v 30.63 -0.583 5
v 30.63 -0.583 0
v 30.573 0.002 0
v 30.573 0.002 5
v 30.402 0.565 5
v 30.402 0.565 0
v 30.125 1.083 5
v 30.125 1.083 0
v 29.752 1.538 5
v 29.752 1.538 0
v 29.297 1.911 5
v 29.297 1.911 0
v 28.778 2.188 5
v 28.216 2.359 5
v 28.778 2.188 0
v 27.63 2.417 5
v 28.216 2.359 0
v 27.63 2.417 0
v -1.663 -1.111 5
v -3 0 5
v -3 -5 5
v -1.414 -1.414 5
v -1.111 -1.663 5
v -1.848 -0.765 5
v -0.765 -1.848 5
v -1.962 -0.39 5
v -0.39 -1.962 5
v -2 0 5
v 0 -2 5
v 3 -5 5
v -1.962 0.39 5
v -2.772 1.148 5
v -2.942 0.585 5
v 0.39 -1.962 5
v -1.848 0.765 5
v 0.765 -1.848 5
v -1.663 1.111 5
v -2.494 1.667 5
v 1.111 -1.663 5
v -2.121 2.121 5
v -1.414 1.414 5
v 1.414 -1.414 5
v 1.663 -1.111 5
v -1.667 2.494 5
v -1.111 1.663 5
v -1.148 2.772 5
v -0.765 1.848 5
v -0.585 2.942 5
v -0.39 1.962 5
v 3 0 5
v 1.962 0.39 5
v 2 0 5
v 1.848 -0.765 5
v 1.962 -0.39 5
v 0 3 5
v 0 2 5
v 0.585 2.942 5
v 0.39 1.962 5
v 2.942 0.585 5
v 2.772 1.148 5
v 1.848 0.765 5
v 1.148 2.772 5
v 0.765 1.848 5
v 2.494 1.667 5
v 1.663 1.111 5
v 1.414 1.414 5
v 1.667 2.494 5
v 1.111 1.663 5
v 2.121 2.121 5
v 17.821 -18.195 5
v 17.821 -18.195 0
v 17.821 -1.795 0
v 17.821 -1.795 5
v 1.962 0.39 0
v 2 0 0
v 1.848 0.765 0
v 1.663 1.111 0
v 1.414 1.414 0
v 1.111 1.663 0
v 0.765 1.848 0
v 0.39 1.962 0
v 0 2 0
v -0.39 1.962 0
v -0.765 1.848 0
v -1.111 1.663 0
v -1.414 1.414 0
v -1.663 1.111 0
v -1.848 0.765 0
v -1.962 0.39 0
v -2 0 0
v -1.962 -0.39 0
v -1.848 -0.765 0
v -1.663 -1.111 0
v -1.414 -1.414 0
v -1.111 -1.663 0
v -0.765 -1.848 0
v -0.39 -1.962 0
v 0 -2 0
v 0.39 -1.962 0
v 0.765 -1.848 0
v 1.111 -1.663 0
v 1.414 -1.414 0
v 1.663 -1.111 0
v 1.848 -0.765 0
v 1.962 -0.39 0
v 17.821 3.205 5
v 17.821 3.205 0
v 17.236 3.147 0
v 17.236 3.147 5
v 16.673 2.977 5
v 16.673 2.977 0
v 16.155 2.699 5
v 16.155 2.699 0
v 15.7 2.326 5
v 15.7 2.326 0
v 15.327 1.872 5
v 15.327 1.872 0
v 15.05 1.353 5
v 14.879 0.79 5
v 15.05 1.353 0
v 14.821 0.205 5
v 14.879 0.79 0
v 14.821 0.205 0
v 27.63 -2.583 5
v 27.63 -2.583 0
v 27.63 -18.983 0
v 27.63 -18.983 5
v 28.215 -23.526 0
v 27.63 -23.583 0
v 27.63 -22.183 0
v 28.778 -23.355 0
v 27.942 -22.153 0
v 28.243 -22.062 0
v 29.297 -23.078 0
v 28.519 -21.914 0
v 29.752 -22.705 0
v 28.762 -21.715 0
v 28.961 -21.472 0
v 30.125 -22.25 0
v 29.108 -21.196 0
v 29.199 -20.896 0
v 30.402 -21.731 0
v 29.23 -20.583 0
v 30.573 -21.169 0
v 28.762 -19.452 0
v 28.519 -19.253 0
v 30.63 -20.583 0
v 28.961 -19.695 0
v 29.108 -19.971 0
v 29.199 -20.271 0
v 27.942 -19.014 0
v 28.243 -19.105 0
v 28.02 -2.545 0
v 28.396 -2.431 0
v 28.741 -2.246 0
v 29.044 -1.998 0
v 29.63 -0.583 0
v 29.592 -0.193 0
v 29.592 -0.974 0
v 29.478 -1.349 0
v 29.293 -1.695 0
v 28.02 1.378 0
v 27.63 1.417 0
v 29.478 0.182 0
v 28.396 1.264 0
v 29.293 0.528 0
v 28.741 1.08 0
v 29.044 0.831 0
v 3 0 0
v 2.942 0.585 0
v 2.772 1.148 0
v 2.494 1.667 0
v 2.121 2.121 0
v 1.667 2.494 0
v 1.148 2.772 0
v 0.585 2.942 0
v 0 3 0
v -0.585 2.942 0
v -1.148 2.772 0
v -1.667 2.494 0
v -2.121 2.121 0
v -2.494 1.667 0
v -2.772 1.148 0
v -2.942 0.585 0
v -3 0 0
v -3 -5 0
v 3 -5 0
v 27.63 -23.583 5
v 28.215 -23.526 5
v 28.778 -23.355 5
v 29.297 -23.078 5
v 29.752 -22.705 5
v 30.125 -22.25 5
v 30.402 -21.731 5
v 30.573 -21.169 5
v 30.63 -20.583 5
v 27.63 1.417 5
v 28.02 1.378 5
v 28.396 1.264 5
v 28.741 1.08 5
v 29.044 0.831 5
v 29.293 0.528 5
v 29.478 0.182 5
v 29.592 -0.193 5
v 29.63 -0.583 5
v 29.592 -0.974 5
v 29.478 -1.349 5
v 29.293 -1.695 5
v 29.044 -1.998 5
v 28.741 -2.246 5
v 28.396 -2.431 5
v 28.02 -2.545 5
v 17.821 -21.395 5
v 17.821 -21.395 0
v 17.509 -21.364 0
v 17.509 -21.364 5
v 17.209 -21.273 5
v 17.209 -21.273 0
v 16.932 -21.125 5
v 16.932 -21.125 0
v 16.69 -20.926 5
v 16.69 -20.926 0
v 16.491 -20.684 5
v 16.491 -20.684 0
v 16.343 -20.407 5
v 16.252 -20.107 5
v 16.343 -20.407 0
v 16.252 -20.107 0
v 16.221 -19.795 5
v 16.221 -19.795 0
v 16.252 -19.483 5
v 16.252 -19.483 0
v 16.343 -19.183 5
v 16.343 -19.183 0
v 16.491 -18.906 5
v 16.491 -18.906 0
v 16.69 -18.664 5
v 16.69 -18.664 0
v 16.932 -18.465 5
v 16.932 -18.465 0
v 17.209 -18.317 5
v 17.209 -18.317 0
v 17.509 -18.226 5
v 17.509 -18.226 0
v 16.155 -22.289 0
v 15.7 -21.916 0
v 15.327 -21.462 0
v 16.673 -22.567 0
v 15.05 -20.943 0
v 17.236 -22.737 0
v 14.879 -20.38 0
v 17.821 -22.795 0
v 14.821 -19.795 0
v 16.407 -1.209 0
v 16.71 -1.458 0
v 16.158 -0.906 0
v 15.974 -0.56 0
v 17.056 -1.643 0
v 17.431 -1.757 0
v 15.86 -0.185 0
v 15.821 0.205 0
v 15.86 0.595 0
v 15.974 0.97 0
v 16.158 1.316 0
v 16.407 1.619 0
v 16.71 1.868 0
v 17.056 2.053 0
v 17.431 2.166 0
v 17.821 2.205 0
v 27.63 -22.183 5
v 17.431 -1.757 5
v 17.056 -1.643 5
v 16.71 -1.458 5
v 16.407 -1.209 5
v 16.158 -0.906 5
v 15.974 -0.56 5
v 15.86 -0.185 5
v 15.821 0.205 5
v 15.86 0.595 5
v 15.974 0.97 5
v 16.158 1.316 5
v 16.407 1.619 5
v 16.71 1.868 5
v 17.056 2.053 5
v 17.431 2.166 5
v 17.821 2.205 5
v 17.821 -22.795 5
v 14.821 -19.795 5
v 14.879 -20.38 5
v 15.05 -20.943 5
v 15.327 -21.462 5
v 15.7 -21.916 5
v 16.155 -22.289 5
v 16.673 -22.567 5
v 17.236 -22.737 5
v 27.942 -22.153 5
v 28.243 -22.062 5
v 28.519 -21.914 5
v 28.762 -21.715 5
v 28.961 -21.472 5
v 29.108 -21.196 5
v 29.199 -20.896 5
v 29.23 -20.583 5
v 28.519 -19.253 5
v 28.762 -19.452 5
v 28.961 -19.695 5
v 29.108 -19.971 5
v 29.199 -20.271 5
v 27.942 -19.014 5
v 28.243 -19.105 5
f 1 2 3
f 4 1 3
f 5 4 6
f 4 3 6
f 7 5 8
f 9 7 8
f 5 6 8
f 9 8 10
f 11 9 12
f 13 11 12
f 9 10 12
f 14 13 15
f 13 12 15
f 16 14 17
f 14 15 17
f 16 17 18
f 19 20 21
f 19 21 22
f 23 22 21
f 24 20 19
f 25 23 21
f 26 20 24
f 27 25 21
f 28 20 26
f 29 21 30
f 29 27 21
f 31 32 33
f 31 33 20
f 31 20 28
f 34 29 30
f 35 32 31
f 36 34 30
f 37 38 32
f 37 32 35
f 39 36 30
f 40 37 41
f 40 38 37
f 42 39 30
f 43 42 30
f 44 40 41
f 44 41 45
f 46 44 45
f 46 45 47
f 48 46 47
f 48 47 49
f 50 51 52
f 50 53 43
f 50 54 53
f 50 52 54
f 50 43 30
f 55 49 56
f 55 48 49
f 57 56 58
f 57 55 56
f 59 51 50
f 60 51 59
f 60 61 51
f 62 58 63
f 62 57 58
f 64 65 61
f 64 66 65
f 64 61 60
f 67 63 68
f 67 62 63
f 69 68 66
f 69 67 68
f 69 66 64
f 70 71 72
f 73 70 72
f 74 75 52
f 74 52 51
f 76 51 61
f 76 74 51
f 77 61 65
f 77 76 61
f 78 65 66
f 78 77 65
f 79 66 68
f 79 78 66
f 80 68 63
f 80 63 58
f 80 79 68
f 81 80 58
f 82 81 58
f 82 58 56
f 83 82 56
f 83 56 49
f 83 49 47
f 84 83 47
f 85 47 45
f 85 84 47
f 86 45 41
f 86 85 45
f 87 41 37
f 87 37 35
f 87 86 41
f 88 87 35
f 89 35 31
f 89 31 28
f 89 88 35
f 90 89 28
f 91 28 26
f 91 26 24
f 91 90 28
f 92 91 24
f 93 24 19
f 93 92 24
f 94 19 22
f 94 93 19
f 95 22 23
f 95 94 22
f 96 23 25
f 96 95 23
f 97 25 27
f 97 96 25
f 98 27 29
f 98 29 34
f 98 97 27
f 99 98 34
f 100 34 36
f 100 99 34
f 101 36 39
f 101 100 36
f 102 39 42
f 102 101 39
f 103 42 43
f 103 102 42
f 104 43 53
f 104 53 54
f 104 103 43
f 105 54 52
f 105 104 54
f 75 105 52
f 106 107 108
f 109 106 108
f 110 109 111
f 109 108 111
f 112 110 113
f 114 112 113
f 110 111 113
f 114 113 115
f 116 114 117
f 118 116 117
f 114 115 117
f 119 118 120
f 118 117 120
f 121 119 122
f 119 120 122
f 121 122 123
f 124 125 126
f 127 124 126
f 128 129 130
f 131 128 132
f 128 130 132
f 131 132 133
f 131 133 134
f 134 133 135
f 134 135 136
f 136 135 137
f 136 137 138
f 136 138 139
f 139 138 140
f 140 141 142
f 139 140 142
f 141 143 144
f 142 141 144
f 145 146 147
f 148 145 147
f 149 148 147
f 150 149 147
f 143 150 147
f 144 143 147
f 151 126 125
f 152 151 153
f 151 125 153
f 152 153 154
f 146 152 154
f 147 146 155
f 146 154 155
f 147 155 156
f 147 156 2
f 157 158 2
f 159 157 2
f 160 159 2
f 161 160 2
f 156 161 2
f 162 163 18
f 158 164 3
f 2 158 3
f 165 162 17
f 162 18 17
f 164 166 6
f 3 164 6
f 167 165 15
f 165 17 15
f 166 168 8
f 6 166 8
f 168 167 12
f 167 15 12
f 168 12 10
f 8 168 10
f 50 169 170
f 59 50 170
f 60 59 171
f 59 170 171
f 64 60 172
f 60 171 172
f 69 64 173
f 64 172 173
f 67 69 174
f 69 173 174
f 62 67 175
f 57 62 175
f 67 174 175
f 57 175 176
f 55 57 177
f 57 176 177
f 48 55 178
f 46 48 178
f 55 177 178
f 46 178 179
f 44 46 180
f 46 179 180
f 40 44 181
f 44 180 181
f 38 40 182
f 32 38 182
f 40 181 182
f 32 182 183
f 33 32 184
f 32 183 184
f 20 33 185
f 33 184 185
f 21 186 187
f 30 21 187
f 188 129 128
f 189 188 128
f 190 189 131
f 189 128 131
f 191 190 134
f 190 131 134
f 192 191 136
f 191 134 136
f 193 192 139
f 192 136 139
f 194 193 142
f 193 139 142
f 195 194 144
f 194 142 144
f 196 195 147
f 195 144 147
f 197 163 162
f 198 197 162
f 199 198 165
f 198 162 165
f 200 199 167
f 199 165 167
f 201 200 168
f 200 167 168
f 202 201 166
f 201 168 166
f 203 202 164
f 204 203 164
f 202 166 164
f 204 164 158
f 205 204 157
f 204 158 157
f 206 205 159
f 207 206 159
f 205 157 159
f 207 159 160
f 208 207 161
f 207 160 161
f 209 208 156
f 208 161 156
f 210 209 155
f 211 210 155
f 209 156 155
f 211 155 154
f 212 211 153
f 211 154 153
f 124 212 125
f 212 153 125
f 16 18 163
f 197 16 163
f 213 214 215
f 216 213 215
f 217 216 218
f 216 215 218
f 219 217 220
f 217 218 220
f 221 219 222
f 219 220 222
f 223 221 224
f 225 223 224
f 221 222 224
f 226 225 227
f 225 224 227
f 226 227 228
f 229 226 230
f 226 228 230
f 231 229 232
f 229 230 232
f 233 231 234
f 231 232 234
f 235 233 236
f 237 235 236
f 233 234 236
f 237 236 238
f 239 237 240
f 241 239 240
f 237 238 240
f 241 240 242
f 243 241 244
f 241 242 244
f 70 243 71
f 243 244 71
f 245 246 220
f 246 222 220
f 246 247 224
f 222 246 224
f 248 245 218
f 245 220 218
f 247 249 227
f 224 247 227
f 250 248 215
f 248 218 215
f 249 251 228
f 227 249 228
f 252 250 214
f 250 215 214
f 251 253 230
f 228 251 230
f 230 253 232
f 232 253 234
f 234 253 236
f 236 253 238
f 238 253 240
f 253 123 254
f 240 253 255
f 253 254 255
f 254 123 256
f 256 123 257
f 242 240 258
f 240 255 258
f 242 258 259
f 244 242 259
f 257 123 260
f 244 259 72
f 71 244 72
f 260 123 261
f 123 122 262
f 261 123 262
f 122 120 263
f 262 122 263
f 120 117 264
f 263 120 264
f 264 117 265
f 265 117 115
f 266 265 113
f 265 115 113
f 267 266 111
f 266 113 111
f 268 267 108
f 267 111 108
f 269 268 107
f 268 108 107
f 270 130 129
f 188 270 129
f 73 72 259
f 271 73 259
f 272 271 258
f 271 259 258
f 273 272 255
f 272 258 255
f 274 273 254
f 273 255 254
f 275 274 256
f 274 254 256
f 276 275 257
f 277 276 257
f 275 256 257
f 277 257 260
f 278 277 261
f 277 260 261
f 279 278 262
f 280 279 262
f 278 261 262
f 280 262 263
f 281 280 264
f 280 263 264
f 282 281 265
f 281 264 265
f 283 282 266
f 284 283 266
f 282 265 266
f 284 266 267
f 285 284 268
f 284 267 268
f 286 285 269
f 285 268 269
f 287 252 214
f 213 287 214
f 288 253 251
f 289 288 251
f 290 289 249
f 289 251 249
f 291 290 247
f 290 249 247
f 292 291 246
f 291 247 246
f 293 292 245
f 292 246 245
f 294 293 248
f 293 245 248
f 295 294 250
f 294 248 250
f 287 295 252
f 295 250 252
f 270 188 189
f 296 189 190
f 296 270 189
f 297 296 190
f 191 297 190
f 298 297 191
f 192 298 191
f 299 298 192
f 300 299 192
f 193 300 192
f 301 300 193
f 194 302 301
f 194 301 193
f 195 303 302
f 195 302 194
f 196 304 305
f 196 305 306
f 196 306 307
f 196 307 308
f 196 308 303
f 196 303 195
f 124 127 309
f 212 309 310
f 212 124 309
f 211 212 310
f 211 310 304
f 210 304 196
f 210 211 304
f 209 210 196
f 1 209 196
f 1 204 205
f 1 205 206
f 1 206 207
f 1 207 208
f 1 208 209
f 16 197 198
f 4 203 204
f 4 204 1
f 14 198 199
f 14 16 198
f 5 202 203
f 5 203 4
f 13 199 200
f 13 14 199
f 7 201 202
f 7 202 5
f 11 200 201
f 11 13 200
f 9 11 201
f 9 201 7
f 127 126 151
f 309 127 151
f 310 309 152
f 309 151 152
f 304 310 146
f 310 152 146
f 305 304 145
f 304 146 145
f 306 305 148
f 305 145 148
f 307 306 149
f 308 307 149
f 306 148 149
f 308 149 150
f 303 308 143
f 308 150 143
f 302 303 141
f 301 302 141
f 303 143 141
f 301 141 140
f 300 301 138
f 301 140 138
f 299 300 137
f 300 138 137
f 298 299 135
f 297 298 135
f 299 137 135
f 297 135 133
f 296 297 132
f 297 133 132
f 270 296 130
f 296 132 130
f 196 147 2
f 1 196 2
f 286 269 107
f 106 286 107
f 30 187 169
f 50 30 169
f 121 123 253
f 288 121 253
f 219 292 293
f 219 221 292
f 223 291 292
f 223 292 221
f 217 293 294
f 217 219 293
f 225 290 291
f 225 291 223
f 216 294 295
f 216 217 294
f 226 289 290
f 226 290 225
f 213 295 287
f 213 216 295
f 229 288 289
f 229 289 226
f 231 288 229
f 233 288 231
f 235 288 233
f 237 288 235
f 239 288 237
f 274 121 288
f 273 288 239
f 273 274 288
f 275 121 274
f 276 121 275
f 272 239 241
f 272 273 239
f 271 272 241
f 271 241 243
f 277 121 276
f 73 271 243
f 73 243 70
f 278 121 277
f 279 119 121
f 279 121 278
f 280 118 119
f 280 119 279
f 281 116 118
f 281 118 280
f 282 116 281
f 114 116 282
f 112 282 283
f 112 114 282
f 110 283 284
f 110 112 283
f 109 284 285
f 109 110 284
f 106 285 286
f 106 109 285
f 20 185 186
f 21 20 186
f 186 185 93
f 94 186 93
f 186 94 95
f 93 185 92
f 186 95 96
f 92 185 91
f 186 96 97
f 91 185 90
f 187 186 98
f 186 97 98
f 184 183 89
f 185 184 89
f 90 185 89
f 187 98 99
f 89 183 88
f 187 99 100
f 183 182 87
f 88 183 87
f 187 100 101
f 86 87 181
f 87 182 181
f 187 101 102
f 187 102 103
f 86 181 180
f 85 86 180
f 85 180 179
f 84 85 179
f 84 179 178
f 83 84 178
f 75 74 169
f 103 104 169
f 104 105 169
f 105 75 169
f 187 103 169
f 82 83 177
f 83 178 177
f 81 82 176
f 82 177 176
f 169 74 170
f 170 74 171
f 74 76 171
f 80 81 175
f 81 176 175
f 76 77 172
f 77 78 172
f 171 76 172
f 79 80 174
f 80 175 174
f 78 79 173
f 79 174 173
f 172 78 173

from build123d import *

# Parameters (mm, degrees)
F0_R     = 2
F1_DEPTH = 5
F3_DEPTH = 5
F5_DEPTH = 5


with BuildPart() as f1:
    # F0 (on Top) → F1 (new body)
    with BuildSketch(Plane.XY):
        with BuildLine():
            Line((3, -5), (3, 0))
            ThreePointArc((3, 0), (0, 3), (-3, 0))
            Line((-3, 0), (-3, -5))
            Line((-3, -5), (3, -5))
        make_face()
        Circle(F0_R, mode=Mode.SUBTRACT)
    extrude(amount=F1_DEPTH)


with BuildPart() as f3:
    # F2 (on Top) → F3 (new body)
    with BuildSketch(Plane.XY):
        with BuildLine():
            ThreePointArc((17.821388, -1.795078), (15.821388, 0.204922), (17.821388, 2.204922))
            Line((17.821388, 2.204922), (17.821388, 3.204922))
            ThreePointArc((17.821388, 3.204922), (15.700068, 2.326243), (14.821388, 0.204922))
            Line((14.821388, 0.204922), (14.821388, -19.795078))
            ThreePointArc((14.821388, -19.795078), (15.700068, -21.916398), (17.821388, -22.795078))
            Line((17.821388, -22.795078), (17.821388, -21.395078))
            ThreePointArc((17.821388, -21.395078), (16.221388, -19.795078), (17.821388, -18.195078))
            Line((17.821388, -18.195078), (17.821388, -1.795078))
        make_face()
    extrude(amount=F3_DEPTH)


with BuildPart() as f5:
    # F4 (on Top) → F5 (new body)
    with BuildSketch(Plane.XY):
        with BuildLine():
            ThreePointArc((27.630229, 1.416571), (29.630229, -0.583429), (27.630229, -2.583429))
            Line((27.630229, -2.583429), (27.630229, -18.983429))
            ThreePointArc((27.630229, -18.983429), (29.230229, -20.583429), (27.630229, -22.183429))
            Line((27.630229, -22.183429), (27.630229, -23.583429))
            ThreePointArc((27.630229, -23.583429), (29.751549, -22.704749), (30.630229, -20.583429))
            Line((30.630229, -20.583429), (30.630229, -0.583429))
            ThreePointArc((30.630229, -0.583429), (29.751549, 1.537892), (27.630229, 2.416571))
            Line((27.630229, 2.416571), (27.630229, 1.416571))
        make_face()
    extrude(amount=F5_DEPTH)


solid = Compound([f1.part, f3.part, f5.part])
